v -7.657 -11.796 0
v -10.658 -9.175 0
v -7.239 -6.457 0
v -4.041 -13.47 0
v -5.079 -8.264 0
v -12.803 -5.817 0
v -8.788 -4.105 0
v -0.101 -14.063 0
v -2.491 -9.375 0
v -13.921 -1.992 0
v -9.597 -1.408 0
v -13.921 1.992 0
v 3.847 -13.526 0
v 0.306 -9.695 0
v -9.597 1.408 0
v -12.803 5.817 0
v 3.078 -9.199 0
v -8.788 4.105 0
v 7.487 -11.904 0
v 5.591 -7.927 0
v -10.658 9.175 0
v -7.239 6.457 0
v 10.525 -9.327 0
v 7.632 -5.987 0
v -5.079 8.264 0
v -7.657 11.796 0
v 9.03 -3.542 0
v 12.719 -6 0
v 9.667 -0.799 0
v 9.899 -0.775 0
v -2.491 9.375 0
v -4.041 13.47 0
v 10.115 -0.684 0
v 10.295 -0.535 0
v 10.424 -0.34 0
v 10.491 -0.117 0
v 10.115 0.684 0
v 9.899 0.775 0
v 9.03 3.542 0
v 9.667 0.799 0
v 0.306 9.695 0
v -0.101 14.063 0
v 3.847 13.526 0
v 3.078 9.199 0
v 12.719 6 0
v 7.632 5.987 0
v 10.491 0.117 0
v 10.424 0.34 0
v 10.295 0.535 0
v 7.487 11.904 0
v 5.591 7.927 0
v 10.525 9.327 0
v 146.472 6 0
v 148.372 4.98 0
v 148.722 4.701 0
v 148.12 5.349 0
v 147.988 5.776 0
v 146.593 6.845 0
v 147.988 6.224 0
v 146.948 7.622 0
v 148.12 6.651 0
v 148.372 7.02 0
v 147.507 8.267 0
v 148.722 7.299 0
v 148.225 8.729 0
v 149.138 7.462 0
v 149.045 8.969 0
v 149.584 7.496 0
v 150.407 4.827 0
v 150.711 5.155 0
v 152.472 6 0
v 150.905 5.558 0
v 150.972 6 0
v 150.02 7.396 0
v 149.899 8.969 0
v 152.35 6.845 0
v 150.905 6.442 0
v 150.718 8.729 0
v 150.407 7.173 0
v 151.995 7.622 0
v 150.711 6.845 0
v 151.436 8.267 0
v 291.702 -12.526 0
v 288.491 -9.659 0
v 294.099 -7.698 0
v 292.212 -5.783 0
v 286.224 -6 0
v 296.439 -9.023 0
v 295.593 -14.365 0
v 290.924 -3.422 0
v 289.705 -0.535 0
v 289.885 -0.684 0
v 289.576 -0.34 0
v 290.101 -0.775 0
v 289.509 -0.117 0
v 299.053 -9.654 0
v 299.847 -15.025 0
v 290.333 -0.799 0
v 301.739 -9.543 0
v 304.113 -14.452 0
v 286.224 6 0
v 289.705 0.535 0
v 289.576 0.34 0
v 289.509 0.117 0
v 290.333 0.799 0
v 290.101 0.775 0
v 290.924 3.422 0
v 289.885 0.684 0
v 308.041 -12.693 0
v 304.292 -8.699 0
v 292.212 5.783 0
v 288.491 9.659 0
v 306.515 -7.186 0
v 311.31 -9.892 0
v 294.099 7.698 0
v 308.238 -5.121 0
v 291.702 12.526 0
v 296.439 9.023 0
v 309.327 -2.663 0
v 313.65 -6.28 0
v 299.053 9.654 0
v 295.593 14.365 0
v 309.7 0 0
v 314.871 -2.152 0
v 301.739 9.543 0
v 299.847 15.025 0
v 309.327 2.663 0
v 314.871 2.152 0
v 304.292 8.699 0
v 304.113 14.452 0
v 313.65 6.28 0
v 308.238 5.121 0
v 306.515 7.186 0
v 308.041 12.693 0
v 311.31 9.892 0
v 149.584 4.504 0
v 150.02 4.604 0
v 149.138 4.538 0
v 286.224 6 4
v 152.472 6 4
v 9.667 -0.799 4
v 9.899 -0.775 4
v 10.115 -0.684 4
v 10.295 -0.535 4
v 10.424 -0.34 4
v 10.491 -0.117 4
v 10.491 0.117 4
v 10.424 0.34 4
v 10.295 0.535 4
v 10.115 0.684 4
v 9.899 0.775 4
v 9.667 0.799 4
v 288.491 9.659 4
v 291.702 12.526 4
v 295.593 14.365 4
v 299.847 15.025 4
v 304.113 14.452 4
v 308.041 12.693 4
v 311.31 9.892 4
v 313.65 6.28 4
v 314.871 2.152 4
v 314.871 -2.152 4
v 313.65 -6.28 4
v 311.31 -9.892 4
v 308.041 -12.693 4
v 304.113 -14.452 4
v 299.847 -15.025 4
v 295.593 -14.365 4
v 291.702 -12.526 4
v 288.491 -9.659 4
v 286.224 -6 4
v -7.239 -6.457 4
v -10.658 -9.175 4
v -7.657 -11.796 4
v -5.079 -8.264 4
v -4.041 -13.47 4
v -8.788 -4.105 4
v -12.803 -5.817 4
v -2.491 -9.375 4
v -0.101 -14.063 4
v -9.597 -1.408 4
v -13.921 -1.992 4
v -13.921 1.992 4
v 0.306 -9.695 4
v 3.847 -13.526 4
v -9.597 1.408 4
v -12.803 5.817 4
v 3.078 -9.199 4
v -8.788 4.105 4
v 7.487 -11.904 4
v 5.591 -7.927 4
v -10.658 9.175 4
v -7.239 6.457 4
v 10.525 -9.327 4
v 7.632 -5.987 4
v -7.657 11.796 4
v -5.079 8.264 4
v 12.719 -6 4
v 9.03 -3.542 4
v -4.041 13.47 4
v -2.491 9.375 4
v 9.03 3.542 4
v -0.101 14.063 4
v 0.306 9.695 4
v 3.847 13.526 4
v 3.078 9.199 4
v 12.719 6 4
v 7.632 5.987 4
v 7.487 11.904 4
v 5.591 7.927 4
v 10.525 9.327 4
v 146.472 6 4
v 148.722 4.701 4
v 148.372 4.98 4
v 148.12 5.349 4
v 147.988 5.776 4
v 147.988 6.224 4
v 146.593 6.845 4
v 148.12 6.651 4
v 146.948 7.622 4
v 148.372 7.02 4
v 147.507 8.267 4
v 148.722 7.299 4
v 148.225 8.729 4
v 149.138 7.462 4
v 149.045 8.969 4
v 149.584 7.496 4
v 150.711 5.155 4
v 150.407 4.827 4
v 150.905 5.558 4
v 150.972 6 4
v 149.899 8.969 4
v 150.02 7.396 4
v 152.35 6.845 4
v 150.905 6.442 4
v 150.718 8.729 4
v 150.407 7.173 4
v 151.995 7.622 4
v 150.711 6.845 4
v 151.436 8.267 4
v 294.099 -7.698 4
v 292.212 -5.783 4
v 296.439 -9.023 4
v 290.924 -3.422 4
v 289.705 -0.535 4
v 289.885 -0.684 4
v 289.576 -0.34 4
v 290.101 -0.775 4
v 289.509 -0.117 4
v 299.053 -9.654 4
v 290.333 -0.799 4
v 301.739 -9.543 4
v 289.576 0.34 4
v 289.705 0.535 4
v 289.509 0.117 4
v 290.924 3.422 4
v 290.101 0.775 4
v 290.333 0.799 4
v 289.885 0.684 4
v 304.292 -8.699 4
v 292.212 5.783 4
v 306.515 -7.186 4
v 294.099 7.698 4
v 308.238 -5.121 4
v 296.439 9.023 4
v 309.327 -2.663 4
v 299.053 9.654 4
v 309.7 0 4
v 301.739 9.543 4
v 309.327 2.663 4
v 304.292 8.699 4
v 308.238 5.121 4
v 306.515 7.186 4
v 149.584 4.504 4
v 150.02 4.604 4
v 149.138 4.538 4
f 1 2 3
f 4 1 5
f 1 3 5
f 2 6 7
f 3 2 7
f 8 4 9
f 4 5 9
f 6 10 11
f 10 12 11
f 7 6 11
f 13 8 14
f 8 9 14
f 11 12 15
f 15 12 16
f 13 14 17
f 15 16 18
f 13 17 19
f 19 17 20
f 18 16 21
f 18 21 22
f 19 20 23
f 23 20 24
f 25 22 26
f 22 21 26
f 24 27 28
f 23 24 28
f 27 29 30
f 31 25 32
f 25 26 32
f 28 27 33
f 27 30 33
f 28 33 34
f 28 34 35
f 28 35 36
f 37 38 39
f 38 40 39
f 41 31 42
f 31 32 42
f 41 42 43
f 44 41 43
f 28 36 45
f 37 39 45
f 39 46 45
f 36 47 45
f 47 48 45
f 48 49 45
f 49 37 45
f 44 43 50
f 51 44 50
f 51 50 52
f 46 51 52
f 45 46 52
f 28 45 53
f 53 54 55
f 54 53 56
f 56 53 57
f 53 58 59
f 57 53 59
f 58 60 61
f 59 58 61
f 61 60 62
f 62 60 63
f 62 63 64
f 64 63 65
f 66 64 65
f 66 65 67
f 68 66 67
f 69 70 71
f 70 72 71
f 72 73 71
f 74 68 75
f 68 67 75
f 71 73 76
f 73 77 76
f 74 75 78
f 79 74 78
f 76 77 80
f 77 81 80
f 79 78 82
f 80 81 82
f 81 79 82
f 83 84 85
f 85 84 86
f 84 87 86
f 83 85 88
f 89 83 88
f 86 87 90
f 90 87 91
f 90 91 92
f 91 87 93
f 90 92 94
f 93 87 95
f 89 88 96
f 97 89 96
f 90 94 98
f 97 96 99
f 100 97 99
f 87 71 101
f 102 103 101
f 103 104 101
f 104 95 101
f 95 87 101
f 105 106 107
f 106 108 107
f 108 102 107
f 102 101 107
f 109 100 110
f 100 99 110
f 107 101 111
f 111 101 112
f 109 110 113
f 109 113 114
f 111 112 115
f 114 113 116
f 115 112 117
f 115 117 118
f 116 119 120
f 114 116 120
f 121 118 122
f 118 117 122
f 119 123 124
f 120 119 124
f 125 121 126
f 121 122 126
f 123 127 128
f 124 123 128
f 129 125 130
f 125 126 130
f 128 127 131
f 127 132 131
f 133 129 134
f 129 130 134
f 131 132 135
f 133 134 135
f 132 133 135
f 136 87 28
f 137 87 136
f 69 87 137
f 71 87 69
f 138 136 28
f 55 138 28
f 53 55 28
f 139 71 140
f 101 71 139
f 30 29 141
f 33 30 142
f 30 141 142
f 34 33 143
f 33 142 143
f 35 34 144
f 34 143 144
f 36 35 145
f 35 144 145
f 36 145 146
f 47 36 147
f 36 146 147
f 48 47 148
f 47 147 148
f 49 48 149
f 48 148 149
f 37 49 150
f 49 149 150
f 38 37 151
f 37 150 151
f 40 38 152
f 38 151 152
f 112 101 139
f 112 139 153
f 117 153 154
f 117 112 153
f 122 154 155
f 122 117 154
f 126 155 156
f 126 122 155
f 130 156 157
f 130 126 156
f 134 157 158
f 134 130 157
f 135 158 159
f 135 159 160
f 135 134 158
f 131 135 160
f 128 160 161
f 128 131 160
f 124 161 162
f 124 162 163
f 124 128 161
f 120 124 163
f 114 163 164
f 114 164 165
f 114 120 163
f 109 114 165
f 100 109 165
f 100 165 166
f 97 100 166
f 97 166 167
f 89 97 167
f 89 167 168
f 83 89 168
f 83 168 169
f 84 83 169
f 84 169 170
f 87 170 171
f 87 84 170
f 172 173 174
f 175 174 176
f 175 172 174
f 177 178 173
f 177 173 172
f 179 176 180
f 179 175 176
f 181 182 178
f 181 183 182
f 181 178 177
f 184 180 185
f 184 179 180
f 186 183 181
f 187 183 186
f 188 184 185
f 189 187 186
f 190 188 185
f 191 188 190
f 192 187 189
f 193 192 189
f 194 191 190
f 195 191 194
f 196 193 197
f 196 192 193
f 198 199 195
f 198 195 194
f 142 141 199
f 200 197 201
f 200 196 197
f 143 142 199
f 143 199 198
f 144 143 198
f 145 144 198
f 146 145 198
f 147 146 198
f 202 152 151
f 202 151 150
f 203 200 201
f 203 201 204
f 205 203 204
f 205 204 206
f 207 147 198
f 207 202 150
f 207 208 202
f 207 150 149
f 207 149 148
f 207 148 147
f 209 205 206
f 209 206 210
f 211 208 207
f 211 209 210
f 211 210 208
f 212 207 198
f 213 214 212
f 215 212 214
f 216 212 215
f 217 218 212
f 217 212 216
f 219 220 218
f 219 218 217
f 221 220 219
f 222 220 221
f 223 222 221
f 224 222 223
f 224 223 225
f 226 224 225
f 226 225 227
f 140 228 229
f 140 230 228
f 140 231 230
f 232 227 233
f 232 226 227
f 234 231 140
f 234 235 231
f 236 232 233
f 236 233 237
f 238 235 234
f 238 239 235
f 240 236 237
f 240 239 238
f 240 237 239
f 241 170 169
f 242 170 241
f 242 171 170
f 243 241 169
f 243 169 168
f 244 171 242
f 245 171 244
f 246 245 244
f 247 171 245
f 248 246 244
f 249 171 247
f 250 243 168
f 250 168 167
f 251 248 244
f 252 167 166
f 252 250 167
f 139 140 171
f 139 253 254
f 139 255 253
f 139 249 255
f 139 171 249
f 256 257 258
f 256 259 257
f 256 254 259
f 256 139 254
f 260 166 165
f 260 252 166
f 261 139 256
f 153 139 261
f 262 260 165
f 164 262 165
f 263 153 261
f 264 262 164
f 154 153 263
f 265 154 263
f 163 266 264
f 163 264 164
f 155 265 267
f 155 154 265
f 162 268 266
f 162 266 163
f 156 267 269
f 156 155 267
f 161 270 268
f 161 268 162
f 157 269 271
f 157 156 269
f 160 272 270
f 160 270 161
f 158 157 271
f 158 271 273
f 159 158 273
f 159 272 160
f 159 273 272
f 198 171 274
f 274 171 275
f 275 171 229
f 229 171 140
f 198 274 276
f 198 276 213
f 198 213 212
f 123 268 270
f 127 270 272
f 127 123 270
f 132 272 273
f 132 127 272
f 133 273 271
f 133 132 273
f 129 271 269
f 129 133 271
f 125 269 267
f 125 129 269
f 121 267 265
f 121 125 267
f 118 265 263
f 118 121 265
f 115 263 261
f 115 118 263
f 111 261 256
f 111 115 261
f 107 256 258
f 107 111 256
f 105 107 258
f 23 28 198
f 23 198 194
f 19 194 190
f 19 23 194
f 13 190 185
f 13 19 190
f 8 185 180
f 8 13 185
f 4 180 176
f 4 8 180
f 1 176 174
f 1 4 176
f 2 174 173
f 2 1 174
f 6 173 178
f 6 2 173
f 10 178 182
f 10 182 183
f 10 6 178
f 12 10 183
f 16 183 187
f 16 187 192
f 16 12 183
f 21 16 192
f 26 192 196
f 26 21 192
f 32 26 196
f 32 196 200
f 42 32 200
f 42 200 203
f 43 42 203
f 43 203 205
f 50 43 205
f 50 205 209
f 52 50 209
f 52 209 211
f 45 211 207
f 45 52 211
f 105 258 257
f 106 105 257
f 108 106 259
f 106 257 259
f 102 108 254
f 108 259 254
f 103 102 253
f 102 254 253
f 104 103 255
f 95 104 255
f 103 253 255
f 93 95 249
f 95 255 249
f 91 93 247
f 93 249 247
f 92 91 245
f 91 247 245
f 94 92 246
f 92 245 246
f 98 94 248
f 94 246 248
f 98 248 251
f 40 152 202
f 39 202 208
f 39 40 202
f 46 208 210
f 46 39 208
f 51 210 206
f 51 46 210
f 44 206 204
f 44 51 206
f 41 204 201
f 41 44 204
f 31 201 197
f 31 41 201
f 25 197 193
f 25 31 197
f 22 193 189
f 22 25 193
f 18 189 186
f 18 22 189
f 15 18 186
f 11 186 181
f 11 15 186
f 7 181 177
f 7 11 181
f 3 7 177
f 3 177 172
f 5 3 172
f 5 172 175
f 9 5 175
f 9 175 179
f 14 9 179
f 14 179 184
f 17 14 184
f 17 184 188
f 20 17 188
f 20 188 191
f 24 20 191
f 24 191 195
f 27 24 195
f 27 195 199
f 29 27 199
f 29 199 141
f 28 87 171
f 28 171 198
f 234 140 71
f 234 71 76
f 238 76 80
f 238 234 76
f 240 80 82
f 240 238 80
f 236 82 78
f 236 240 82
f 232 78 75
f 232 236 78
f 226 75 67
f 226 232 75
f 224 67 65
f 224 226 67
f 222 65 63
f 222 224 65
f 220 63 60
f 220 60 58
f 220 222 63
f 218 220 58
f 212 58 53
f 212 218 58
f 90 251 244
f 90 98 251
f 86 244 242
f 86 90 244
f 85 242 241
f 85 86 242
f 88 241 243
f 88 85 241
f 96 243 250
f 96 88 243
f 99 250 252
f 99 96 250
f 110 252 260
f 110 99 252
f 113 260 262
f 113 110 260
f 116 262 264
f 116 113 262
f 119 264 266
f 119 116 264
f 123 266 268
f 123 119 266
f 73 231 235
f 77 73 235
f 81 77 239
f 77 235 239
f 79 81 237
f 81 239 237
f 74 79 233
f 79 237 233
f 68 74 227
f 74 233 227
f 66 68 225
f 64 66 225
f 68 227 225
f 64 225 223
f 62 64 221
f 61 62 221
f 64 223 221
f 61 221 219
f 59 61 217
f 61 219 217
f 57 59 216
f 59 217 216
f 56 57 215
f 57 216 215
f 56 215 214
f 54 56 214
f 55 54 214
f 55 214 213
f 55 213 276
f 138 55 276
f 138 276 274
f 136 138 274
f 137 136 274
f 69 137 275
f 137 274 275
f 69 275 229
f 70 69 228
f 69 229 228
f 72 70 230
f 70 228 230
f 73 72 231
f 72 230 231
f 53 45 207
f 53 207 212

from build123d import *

# Parameters (mm, degrees)
SKETCH_1_R          = 9.7
EXTRUDE_1_DEPTH     = 4
SKETCH_3_R          = 0.8
CUT_EXTRUDE_1_DEPTH = 10
SKETCH_4_R          = 3
EXTRUDE_2_DEPTH     = 4
SKETCH_5_R          = 1.5
CUT_EXTRUDE_2_DEPTH = 4


with BuildPart() as part:
    # 草图1 → 凸台-拉伸1 (new body)
    with BuildSketch(Plane.XY):
        with BuildLine():
            Line((12.718684308, 6), (286.224480753, 6))
            ThreePointArc((286.224480753, 6), (315.02547605, 0), (286.224480753, -6))
            Line((286.224480753, -6), (12.718684308, -6))
            ThreePointArc((12.718684308, -6), (-14.062891969, 0), (12.718684308, 6))
        make_face()
        Circle(SKETCH_1_R, mode=Mode.SUBTRACT)
        with Locations((300, 0)):
            Circle(SKETCH_1_R, mode=Mode.SUBTRACT)
    extrude(amount=EXTRUDE_1_DEPTH)

    # 草图3 → 切除-拉伸1 (cut)
    with BuildSketch(Plane.XY.offset(4)):
        with Locations((9.7, 0)):
            Circle(SKETCH_3_R)
        with Locations((290.3, 0)):
            Circle(SKETCH_3_R)
    extrude(amount=-CUT_EXTRUDE_1_DEPTH, mode=Mode.SUBTRACT)

    # 草图4 → 凸台-拉伸2 (add)
    with BuildSketch(Plane.XY.offset(4)):
        with Locations((149.47158253, 6)):
            Circle(SKETCH_4_R)
    extrude(amount=-EXTRUDE_2_DEPTH)

    # 草图5 → 切除-拉伸2 (cut)
    with BuildSketch(Plane.XY.offset(4)):
        with Locations((149.47158253, 6)):
            Circle(SKETCH_5_R)
    extrude(amount=-CUT_EXTRUDE_2_DEPTH, mode=Mode.SUBTRACT)


solid = part.part
